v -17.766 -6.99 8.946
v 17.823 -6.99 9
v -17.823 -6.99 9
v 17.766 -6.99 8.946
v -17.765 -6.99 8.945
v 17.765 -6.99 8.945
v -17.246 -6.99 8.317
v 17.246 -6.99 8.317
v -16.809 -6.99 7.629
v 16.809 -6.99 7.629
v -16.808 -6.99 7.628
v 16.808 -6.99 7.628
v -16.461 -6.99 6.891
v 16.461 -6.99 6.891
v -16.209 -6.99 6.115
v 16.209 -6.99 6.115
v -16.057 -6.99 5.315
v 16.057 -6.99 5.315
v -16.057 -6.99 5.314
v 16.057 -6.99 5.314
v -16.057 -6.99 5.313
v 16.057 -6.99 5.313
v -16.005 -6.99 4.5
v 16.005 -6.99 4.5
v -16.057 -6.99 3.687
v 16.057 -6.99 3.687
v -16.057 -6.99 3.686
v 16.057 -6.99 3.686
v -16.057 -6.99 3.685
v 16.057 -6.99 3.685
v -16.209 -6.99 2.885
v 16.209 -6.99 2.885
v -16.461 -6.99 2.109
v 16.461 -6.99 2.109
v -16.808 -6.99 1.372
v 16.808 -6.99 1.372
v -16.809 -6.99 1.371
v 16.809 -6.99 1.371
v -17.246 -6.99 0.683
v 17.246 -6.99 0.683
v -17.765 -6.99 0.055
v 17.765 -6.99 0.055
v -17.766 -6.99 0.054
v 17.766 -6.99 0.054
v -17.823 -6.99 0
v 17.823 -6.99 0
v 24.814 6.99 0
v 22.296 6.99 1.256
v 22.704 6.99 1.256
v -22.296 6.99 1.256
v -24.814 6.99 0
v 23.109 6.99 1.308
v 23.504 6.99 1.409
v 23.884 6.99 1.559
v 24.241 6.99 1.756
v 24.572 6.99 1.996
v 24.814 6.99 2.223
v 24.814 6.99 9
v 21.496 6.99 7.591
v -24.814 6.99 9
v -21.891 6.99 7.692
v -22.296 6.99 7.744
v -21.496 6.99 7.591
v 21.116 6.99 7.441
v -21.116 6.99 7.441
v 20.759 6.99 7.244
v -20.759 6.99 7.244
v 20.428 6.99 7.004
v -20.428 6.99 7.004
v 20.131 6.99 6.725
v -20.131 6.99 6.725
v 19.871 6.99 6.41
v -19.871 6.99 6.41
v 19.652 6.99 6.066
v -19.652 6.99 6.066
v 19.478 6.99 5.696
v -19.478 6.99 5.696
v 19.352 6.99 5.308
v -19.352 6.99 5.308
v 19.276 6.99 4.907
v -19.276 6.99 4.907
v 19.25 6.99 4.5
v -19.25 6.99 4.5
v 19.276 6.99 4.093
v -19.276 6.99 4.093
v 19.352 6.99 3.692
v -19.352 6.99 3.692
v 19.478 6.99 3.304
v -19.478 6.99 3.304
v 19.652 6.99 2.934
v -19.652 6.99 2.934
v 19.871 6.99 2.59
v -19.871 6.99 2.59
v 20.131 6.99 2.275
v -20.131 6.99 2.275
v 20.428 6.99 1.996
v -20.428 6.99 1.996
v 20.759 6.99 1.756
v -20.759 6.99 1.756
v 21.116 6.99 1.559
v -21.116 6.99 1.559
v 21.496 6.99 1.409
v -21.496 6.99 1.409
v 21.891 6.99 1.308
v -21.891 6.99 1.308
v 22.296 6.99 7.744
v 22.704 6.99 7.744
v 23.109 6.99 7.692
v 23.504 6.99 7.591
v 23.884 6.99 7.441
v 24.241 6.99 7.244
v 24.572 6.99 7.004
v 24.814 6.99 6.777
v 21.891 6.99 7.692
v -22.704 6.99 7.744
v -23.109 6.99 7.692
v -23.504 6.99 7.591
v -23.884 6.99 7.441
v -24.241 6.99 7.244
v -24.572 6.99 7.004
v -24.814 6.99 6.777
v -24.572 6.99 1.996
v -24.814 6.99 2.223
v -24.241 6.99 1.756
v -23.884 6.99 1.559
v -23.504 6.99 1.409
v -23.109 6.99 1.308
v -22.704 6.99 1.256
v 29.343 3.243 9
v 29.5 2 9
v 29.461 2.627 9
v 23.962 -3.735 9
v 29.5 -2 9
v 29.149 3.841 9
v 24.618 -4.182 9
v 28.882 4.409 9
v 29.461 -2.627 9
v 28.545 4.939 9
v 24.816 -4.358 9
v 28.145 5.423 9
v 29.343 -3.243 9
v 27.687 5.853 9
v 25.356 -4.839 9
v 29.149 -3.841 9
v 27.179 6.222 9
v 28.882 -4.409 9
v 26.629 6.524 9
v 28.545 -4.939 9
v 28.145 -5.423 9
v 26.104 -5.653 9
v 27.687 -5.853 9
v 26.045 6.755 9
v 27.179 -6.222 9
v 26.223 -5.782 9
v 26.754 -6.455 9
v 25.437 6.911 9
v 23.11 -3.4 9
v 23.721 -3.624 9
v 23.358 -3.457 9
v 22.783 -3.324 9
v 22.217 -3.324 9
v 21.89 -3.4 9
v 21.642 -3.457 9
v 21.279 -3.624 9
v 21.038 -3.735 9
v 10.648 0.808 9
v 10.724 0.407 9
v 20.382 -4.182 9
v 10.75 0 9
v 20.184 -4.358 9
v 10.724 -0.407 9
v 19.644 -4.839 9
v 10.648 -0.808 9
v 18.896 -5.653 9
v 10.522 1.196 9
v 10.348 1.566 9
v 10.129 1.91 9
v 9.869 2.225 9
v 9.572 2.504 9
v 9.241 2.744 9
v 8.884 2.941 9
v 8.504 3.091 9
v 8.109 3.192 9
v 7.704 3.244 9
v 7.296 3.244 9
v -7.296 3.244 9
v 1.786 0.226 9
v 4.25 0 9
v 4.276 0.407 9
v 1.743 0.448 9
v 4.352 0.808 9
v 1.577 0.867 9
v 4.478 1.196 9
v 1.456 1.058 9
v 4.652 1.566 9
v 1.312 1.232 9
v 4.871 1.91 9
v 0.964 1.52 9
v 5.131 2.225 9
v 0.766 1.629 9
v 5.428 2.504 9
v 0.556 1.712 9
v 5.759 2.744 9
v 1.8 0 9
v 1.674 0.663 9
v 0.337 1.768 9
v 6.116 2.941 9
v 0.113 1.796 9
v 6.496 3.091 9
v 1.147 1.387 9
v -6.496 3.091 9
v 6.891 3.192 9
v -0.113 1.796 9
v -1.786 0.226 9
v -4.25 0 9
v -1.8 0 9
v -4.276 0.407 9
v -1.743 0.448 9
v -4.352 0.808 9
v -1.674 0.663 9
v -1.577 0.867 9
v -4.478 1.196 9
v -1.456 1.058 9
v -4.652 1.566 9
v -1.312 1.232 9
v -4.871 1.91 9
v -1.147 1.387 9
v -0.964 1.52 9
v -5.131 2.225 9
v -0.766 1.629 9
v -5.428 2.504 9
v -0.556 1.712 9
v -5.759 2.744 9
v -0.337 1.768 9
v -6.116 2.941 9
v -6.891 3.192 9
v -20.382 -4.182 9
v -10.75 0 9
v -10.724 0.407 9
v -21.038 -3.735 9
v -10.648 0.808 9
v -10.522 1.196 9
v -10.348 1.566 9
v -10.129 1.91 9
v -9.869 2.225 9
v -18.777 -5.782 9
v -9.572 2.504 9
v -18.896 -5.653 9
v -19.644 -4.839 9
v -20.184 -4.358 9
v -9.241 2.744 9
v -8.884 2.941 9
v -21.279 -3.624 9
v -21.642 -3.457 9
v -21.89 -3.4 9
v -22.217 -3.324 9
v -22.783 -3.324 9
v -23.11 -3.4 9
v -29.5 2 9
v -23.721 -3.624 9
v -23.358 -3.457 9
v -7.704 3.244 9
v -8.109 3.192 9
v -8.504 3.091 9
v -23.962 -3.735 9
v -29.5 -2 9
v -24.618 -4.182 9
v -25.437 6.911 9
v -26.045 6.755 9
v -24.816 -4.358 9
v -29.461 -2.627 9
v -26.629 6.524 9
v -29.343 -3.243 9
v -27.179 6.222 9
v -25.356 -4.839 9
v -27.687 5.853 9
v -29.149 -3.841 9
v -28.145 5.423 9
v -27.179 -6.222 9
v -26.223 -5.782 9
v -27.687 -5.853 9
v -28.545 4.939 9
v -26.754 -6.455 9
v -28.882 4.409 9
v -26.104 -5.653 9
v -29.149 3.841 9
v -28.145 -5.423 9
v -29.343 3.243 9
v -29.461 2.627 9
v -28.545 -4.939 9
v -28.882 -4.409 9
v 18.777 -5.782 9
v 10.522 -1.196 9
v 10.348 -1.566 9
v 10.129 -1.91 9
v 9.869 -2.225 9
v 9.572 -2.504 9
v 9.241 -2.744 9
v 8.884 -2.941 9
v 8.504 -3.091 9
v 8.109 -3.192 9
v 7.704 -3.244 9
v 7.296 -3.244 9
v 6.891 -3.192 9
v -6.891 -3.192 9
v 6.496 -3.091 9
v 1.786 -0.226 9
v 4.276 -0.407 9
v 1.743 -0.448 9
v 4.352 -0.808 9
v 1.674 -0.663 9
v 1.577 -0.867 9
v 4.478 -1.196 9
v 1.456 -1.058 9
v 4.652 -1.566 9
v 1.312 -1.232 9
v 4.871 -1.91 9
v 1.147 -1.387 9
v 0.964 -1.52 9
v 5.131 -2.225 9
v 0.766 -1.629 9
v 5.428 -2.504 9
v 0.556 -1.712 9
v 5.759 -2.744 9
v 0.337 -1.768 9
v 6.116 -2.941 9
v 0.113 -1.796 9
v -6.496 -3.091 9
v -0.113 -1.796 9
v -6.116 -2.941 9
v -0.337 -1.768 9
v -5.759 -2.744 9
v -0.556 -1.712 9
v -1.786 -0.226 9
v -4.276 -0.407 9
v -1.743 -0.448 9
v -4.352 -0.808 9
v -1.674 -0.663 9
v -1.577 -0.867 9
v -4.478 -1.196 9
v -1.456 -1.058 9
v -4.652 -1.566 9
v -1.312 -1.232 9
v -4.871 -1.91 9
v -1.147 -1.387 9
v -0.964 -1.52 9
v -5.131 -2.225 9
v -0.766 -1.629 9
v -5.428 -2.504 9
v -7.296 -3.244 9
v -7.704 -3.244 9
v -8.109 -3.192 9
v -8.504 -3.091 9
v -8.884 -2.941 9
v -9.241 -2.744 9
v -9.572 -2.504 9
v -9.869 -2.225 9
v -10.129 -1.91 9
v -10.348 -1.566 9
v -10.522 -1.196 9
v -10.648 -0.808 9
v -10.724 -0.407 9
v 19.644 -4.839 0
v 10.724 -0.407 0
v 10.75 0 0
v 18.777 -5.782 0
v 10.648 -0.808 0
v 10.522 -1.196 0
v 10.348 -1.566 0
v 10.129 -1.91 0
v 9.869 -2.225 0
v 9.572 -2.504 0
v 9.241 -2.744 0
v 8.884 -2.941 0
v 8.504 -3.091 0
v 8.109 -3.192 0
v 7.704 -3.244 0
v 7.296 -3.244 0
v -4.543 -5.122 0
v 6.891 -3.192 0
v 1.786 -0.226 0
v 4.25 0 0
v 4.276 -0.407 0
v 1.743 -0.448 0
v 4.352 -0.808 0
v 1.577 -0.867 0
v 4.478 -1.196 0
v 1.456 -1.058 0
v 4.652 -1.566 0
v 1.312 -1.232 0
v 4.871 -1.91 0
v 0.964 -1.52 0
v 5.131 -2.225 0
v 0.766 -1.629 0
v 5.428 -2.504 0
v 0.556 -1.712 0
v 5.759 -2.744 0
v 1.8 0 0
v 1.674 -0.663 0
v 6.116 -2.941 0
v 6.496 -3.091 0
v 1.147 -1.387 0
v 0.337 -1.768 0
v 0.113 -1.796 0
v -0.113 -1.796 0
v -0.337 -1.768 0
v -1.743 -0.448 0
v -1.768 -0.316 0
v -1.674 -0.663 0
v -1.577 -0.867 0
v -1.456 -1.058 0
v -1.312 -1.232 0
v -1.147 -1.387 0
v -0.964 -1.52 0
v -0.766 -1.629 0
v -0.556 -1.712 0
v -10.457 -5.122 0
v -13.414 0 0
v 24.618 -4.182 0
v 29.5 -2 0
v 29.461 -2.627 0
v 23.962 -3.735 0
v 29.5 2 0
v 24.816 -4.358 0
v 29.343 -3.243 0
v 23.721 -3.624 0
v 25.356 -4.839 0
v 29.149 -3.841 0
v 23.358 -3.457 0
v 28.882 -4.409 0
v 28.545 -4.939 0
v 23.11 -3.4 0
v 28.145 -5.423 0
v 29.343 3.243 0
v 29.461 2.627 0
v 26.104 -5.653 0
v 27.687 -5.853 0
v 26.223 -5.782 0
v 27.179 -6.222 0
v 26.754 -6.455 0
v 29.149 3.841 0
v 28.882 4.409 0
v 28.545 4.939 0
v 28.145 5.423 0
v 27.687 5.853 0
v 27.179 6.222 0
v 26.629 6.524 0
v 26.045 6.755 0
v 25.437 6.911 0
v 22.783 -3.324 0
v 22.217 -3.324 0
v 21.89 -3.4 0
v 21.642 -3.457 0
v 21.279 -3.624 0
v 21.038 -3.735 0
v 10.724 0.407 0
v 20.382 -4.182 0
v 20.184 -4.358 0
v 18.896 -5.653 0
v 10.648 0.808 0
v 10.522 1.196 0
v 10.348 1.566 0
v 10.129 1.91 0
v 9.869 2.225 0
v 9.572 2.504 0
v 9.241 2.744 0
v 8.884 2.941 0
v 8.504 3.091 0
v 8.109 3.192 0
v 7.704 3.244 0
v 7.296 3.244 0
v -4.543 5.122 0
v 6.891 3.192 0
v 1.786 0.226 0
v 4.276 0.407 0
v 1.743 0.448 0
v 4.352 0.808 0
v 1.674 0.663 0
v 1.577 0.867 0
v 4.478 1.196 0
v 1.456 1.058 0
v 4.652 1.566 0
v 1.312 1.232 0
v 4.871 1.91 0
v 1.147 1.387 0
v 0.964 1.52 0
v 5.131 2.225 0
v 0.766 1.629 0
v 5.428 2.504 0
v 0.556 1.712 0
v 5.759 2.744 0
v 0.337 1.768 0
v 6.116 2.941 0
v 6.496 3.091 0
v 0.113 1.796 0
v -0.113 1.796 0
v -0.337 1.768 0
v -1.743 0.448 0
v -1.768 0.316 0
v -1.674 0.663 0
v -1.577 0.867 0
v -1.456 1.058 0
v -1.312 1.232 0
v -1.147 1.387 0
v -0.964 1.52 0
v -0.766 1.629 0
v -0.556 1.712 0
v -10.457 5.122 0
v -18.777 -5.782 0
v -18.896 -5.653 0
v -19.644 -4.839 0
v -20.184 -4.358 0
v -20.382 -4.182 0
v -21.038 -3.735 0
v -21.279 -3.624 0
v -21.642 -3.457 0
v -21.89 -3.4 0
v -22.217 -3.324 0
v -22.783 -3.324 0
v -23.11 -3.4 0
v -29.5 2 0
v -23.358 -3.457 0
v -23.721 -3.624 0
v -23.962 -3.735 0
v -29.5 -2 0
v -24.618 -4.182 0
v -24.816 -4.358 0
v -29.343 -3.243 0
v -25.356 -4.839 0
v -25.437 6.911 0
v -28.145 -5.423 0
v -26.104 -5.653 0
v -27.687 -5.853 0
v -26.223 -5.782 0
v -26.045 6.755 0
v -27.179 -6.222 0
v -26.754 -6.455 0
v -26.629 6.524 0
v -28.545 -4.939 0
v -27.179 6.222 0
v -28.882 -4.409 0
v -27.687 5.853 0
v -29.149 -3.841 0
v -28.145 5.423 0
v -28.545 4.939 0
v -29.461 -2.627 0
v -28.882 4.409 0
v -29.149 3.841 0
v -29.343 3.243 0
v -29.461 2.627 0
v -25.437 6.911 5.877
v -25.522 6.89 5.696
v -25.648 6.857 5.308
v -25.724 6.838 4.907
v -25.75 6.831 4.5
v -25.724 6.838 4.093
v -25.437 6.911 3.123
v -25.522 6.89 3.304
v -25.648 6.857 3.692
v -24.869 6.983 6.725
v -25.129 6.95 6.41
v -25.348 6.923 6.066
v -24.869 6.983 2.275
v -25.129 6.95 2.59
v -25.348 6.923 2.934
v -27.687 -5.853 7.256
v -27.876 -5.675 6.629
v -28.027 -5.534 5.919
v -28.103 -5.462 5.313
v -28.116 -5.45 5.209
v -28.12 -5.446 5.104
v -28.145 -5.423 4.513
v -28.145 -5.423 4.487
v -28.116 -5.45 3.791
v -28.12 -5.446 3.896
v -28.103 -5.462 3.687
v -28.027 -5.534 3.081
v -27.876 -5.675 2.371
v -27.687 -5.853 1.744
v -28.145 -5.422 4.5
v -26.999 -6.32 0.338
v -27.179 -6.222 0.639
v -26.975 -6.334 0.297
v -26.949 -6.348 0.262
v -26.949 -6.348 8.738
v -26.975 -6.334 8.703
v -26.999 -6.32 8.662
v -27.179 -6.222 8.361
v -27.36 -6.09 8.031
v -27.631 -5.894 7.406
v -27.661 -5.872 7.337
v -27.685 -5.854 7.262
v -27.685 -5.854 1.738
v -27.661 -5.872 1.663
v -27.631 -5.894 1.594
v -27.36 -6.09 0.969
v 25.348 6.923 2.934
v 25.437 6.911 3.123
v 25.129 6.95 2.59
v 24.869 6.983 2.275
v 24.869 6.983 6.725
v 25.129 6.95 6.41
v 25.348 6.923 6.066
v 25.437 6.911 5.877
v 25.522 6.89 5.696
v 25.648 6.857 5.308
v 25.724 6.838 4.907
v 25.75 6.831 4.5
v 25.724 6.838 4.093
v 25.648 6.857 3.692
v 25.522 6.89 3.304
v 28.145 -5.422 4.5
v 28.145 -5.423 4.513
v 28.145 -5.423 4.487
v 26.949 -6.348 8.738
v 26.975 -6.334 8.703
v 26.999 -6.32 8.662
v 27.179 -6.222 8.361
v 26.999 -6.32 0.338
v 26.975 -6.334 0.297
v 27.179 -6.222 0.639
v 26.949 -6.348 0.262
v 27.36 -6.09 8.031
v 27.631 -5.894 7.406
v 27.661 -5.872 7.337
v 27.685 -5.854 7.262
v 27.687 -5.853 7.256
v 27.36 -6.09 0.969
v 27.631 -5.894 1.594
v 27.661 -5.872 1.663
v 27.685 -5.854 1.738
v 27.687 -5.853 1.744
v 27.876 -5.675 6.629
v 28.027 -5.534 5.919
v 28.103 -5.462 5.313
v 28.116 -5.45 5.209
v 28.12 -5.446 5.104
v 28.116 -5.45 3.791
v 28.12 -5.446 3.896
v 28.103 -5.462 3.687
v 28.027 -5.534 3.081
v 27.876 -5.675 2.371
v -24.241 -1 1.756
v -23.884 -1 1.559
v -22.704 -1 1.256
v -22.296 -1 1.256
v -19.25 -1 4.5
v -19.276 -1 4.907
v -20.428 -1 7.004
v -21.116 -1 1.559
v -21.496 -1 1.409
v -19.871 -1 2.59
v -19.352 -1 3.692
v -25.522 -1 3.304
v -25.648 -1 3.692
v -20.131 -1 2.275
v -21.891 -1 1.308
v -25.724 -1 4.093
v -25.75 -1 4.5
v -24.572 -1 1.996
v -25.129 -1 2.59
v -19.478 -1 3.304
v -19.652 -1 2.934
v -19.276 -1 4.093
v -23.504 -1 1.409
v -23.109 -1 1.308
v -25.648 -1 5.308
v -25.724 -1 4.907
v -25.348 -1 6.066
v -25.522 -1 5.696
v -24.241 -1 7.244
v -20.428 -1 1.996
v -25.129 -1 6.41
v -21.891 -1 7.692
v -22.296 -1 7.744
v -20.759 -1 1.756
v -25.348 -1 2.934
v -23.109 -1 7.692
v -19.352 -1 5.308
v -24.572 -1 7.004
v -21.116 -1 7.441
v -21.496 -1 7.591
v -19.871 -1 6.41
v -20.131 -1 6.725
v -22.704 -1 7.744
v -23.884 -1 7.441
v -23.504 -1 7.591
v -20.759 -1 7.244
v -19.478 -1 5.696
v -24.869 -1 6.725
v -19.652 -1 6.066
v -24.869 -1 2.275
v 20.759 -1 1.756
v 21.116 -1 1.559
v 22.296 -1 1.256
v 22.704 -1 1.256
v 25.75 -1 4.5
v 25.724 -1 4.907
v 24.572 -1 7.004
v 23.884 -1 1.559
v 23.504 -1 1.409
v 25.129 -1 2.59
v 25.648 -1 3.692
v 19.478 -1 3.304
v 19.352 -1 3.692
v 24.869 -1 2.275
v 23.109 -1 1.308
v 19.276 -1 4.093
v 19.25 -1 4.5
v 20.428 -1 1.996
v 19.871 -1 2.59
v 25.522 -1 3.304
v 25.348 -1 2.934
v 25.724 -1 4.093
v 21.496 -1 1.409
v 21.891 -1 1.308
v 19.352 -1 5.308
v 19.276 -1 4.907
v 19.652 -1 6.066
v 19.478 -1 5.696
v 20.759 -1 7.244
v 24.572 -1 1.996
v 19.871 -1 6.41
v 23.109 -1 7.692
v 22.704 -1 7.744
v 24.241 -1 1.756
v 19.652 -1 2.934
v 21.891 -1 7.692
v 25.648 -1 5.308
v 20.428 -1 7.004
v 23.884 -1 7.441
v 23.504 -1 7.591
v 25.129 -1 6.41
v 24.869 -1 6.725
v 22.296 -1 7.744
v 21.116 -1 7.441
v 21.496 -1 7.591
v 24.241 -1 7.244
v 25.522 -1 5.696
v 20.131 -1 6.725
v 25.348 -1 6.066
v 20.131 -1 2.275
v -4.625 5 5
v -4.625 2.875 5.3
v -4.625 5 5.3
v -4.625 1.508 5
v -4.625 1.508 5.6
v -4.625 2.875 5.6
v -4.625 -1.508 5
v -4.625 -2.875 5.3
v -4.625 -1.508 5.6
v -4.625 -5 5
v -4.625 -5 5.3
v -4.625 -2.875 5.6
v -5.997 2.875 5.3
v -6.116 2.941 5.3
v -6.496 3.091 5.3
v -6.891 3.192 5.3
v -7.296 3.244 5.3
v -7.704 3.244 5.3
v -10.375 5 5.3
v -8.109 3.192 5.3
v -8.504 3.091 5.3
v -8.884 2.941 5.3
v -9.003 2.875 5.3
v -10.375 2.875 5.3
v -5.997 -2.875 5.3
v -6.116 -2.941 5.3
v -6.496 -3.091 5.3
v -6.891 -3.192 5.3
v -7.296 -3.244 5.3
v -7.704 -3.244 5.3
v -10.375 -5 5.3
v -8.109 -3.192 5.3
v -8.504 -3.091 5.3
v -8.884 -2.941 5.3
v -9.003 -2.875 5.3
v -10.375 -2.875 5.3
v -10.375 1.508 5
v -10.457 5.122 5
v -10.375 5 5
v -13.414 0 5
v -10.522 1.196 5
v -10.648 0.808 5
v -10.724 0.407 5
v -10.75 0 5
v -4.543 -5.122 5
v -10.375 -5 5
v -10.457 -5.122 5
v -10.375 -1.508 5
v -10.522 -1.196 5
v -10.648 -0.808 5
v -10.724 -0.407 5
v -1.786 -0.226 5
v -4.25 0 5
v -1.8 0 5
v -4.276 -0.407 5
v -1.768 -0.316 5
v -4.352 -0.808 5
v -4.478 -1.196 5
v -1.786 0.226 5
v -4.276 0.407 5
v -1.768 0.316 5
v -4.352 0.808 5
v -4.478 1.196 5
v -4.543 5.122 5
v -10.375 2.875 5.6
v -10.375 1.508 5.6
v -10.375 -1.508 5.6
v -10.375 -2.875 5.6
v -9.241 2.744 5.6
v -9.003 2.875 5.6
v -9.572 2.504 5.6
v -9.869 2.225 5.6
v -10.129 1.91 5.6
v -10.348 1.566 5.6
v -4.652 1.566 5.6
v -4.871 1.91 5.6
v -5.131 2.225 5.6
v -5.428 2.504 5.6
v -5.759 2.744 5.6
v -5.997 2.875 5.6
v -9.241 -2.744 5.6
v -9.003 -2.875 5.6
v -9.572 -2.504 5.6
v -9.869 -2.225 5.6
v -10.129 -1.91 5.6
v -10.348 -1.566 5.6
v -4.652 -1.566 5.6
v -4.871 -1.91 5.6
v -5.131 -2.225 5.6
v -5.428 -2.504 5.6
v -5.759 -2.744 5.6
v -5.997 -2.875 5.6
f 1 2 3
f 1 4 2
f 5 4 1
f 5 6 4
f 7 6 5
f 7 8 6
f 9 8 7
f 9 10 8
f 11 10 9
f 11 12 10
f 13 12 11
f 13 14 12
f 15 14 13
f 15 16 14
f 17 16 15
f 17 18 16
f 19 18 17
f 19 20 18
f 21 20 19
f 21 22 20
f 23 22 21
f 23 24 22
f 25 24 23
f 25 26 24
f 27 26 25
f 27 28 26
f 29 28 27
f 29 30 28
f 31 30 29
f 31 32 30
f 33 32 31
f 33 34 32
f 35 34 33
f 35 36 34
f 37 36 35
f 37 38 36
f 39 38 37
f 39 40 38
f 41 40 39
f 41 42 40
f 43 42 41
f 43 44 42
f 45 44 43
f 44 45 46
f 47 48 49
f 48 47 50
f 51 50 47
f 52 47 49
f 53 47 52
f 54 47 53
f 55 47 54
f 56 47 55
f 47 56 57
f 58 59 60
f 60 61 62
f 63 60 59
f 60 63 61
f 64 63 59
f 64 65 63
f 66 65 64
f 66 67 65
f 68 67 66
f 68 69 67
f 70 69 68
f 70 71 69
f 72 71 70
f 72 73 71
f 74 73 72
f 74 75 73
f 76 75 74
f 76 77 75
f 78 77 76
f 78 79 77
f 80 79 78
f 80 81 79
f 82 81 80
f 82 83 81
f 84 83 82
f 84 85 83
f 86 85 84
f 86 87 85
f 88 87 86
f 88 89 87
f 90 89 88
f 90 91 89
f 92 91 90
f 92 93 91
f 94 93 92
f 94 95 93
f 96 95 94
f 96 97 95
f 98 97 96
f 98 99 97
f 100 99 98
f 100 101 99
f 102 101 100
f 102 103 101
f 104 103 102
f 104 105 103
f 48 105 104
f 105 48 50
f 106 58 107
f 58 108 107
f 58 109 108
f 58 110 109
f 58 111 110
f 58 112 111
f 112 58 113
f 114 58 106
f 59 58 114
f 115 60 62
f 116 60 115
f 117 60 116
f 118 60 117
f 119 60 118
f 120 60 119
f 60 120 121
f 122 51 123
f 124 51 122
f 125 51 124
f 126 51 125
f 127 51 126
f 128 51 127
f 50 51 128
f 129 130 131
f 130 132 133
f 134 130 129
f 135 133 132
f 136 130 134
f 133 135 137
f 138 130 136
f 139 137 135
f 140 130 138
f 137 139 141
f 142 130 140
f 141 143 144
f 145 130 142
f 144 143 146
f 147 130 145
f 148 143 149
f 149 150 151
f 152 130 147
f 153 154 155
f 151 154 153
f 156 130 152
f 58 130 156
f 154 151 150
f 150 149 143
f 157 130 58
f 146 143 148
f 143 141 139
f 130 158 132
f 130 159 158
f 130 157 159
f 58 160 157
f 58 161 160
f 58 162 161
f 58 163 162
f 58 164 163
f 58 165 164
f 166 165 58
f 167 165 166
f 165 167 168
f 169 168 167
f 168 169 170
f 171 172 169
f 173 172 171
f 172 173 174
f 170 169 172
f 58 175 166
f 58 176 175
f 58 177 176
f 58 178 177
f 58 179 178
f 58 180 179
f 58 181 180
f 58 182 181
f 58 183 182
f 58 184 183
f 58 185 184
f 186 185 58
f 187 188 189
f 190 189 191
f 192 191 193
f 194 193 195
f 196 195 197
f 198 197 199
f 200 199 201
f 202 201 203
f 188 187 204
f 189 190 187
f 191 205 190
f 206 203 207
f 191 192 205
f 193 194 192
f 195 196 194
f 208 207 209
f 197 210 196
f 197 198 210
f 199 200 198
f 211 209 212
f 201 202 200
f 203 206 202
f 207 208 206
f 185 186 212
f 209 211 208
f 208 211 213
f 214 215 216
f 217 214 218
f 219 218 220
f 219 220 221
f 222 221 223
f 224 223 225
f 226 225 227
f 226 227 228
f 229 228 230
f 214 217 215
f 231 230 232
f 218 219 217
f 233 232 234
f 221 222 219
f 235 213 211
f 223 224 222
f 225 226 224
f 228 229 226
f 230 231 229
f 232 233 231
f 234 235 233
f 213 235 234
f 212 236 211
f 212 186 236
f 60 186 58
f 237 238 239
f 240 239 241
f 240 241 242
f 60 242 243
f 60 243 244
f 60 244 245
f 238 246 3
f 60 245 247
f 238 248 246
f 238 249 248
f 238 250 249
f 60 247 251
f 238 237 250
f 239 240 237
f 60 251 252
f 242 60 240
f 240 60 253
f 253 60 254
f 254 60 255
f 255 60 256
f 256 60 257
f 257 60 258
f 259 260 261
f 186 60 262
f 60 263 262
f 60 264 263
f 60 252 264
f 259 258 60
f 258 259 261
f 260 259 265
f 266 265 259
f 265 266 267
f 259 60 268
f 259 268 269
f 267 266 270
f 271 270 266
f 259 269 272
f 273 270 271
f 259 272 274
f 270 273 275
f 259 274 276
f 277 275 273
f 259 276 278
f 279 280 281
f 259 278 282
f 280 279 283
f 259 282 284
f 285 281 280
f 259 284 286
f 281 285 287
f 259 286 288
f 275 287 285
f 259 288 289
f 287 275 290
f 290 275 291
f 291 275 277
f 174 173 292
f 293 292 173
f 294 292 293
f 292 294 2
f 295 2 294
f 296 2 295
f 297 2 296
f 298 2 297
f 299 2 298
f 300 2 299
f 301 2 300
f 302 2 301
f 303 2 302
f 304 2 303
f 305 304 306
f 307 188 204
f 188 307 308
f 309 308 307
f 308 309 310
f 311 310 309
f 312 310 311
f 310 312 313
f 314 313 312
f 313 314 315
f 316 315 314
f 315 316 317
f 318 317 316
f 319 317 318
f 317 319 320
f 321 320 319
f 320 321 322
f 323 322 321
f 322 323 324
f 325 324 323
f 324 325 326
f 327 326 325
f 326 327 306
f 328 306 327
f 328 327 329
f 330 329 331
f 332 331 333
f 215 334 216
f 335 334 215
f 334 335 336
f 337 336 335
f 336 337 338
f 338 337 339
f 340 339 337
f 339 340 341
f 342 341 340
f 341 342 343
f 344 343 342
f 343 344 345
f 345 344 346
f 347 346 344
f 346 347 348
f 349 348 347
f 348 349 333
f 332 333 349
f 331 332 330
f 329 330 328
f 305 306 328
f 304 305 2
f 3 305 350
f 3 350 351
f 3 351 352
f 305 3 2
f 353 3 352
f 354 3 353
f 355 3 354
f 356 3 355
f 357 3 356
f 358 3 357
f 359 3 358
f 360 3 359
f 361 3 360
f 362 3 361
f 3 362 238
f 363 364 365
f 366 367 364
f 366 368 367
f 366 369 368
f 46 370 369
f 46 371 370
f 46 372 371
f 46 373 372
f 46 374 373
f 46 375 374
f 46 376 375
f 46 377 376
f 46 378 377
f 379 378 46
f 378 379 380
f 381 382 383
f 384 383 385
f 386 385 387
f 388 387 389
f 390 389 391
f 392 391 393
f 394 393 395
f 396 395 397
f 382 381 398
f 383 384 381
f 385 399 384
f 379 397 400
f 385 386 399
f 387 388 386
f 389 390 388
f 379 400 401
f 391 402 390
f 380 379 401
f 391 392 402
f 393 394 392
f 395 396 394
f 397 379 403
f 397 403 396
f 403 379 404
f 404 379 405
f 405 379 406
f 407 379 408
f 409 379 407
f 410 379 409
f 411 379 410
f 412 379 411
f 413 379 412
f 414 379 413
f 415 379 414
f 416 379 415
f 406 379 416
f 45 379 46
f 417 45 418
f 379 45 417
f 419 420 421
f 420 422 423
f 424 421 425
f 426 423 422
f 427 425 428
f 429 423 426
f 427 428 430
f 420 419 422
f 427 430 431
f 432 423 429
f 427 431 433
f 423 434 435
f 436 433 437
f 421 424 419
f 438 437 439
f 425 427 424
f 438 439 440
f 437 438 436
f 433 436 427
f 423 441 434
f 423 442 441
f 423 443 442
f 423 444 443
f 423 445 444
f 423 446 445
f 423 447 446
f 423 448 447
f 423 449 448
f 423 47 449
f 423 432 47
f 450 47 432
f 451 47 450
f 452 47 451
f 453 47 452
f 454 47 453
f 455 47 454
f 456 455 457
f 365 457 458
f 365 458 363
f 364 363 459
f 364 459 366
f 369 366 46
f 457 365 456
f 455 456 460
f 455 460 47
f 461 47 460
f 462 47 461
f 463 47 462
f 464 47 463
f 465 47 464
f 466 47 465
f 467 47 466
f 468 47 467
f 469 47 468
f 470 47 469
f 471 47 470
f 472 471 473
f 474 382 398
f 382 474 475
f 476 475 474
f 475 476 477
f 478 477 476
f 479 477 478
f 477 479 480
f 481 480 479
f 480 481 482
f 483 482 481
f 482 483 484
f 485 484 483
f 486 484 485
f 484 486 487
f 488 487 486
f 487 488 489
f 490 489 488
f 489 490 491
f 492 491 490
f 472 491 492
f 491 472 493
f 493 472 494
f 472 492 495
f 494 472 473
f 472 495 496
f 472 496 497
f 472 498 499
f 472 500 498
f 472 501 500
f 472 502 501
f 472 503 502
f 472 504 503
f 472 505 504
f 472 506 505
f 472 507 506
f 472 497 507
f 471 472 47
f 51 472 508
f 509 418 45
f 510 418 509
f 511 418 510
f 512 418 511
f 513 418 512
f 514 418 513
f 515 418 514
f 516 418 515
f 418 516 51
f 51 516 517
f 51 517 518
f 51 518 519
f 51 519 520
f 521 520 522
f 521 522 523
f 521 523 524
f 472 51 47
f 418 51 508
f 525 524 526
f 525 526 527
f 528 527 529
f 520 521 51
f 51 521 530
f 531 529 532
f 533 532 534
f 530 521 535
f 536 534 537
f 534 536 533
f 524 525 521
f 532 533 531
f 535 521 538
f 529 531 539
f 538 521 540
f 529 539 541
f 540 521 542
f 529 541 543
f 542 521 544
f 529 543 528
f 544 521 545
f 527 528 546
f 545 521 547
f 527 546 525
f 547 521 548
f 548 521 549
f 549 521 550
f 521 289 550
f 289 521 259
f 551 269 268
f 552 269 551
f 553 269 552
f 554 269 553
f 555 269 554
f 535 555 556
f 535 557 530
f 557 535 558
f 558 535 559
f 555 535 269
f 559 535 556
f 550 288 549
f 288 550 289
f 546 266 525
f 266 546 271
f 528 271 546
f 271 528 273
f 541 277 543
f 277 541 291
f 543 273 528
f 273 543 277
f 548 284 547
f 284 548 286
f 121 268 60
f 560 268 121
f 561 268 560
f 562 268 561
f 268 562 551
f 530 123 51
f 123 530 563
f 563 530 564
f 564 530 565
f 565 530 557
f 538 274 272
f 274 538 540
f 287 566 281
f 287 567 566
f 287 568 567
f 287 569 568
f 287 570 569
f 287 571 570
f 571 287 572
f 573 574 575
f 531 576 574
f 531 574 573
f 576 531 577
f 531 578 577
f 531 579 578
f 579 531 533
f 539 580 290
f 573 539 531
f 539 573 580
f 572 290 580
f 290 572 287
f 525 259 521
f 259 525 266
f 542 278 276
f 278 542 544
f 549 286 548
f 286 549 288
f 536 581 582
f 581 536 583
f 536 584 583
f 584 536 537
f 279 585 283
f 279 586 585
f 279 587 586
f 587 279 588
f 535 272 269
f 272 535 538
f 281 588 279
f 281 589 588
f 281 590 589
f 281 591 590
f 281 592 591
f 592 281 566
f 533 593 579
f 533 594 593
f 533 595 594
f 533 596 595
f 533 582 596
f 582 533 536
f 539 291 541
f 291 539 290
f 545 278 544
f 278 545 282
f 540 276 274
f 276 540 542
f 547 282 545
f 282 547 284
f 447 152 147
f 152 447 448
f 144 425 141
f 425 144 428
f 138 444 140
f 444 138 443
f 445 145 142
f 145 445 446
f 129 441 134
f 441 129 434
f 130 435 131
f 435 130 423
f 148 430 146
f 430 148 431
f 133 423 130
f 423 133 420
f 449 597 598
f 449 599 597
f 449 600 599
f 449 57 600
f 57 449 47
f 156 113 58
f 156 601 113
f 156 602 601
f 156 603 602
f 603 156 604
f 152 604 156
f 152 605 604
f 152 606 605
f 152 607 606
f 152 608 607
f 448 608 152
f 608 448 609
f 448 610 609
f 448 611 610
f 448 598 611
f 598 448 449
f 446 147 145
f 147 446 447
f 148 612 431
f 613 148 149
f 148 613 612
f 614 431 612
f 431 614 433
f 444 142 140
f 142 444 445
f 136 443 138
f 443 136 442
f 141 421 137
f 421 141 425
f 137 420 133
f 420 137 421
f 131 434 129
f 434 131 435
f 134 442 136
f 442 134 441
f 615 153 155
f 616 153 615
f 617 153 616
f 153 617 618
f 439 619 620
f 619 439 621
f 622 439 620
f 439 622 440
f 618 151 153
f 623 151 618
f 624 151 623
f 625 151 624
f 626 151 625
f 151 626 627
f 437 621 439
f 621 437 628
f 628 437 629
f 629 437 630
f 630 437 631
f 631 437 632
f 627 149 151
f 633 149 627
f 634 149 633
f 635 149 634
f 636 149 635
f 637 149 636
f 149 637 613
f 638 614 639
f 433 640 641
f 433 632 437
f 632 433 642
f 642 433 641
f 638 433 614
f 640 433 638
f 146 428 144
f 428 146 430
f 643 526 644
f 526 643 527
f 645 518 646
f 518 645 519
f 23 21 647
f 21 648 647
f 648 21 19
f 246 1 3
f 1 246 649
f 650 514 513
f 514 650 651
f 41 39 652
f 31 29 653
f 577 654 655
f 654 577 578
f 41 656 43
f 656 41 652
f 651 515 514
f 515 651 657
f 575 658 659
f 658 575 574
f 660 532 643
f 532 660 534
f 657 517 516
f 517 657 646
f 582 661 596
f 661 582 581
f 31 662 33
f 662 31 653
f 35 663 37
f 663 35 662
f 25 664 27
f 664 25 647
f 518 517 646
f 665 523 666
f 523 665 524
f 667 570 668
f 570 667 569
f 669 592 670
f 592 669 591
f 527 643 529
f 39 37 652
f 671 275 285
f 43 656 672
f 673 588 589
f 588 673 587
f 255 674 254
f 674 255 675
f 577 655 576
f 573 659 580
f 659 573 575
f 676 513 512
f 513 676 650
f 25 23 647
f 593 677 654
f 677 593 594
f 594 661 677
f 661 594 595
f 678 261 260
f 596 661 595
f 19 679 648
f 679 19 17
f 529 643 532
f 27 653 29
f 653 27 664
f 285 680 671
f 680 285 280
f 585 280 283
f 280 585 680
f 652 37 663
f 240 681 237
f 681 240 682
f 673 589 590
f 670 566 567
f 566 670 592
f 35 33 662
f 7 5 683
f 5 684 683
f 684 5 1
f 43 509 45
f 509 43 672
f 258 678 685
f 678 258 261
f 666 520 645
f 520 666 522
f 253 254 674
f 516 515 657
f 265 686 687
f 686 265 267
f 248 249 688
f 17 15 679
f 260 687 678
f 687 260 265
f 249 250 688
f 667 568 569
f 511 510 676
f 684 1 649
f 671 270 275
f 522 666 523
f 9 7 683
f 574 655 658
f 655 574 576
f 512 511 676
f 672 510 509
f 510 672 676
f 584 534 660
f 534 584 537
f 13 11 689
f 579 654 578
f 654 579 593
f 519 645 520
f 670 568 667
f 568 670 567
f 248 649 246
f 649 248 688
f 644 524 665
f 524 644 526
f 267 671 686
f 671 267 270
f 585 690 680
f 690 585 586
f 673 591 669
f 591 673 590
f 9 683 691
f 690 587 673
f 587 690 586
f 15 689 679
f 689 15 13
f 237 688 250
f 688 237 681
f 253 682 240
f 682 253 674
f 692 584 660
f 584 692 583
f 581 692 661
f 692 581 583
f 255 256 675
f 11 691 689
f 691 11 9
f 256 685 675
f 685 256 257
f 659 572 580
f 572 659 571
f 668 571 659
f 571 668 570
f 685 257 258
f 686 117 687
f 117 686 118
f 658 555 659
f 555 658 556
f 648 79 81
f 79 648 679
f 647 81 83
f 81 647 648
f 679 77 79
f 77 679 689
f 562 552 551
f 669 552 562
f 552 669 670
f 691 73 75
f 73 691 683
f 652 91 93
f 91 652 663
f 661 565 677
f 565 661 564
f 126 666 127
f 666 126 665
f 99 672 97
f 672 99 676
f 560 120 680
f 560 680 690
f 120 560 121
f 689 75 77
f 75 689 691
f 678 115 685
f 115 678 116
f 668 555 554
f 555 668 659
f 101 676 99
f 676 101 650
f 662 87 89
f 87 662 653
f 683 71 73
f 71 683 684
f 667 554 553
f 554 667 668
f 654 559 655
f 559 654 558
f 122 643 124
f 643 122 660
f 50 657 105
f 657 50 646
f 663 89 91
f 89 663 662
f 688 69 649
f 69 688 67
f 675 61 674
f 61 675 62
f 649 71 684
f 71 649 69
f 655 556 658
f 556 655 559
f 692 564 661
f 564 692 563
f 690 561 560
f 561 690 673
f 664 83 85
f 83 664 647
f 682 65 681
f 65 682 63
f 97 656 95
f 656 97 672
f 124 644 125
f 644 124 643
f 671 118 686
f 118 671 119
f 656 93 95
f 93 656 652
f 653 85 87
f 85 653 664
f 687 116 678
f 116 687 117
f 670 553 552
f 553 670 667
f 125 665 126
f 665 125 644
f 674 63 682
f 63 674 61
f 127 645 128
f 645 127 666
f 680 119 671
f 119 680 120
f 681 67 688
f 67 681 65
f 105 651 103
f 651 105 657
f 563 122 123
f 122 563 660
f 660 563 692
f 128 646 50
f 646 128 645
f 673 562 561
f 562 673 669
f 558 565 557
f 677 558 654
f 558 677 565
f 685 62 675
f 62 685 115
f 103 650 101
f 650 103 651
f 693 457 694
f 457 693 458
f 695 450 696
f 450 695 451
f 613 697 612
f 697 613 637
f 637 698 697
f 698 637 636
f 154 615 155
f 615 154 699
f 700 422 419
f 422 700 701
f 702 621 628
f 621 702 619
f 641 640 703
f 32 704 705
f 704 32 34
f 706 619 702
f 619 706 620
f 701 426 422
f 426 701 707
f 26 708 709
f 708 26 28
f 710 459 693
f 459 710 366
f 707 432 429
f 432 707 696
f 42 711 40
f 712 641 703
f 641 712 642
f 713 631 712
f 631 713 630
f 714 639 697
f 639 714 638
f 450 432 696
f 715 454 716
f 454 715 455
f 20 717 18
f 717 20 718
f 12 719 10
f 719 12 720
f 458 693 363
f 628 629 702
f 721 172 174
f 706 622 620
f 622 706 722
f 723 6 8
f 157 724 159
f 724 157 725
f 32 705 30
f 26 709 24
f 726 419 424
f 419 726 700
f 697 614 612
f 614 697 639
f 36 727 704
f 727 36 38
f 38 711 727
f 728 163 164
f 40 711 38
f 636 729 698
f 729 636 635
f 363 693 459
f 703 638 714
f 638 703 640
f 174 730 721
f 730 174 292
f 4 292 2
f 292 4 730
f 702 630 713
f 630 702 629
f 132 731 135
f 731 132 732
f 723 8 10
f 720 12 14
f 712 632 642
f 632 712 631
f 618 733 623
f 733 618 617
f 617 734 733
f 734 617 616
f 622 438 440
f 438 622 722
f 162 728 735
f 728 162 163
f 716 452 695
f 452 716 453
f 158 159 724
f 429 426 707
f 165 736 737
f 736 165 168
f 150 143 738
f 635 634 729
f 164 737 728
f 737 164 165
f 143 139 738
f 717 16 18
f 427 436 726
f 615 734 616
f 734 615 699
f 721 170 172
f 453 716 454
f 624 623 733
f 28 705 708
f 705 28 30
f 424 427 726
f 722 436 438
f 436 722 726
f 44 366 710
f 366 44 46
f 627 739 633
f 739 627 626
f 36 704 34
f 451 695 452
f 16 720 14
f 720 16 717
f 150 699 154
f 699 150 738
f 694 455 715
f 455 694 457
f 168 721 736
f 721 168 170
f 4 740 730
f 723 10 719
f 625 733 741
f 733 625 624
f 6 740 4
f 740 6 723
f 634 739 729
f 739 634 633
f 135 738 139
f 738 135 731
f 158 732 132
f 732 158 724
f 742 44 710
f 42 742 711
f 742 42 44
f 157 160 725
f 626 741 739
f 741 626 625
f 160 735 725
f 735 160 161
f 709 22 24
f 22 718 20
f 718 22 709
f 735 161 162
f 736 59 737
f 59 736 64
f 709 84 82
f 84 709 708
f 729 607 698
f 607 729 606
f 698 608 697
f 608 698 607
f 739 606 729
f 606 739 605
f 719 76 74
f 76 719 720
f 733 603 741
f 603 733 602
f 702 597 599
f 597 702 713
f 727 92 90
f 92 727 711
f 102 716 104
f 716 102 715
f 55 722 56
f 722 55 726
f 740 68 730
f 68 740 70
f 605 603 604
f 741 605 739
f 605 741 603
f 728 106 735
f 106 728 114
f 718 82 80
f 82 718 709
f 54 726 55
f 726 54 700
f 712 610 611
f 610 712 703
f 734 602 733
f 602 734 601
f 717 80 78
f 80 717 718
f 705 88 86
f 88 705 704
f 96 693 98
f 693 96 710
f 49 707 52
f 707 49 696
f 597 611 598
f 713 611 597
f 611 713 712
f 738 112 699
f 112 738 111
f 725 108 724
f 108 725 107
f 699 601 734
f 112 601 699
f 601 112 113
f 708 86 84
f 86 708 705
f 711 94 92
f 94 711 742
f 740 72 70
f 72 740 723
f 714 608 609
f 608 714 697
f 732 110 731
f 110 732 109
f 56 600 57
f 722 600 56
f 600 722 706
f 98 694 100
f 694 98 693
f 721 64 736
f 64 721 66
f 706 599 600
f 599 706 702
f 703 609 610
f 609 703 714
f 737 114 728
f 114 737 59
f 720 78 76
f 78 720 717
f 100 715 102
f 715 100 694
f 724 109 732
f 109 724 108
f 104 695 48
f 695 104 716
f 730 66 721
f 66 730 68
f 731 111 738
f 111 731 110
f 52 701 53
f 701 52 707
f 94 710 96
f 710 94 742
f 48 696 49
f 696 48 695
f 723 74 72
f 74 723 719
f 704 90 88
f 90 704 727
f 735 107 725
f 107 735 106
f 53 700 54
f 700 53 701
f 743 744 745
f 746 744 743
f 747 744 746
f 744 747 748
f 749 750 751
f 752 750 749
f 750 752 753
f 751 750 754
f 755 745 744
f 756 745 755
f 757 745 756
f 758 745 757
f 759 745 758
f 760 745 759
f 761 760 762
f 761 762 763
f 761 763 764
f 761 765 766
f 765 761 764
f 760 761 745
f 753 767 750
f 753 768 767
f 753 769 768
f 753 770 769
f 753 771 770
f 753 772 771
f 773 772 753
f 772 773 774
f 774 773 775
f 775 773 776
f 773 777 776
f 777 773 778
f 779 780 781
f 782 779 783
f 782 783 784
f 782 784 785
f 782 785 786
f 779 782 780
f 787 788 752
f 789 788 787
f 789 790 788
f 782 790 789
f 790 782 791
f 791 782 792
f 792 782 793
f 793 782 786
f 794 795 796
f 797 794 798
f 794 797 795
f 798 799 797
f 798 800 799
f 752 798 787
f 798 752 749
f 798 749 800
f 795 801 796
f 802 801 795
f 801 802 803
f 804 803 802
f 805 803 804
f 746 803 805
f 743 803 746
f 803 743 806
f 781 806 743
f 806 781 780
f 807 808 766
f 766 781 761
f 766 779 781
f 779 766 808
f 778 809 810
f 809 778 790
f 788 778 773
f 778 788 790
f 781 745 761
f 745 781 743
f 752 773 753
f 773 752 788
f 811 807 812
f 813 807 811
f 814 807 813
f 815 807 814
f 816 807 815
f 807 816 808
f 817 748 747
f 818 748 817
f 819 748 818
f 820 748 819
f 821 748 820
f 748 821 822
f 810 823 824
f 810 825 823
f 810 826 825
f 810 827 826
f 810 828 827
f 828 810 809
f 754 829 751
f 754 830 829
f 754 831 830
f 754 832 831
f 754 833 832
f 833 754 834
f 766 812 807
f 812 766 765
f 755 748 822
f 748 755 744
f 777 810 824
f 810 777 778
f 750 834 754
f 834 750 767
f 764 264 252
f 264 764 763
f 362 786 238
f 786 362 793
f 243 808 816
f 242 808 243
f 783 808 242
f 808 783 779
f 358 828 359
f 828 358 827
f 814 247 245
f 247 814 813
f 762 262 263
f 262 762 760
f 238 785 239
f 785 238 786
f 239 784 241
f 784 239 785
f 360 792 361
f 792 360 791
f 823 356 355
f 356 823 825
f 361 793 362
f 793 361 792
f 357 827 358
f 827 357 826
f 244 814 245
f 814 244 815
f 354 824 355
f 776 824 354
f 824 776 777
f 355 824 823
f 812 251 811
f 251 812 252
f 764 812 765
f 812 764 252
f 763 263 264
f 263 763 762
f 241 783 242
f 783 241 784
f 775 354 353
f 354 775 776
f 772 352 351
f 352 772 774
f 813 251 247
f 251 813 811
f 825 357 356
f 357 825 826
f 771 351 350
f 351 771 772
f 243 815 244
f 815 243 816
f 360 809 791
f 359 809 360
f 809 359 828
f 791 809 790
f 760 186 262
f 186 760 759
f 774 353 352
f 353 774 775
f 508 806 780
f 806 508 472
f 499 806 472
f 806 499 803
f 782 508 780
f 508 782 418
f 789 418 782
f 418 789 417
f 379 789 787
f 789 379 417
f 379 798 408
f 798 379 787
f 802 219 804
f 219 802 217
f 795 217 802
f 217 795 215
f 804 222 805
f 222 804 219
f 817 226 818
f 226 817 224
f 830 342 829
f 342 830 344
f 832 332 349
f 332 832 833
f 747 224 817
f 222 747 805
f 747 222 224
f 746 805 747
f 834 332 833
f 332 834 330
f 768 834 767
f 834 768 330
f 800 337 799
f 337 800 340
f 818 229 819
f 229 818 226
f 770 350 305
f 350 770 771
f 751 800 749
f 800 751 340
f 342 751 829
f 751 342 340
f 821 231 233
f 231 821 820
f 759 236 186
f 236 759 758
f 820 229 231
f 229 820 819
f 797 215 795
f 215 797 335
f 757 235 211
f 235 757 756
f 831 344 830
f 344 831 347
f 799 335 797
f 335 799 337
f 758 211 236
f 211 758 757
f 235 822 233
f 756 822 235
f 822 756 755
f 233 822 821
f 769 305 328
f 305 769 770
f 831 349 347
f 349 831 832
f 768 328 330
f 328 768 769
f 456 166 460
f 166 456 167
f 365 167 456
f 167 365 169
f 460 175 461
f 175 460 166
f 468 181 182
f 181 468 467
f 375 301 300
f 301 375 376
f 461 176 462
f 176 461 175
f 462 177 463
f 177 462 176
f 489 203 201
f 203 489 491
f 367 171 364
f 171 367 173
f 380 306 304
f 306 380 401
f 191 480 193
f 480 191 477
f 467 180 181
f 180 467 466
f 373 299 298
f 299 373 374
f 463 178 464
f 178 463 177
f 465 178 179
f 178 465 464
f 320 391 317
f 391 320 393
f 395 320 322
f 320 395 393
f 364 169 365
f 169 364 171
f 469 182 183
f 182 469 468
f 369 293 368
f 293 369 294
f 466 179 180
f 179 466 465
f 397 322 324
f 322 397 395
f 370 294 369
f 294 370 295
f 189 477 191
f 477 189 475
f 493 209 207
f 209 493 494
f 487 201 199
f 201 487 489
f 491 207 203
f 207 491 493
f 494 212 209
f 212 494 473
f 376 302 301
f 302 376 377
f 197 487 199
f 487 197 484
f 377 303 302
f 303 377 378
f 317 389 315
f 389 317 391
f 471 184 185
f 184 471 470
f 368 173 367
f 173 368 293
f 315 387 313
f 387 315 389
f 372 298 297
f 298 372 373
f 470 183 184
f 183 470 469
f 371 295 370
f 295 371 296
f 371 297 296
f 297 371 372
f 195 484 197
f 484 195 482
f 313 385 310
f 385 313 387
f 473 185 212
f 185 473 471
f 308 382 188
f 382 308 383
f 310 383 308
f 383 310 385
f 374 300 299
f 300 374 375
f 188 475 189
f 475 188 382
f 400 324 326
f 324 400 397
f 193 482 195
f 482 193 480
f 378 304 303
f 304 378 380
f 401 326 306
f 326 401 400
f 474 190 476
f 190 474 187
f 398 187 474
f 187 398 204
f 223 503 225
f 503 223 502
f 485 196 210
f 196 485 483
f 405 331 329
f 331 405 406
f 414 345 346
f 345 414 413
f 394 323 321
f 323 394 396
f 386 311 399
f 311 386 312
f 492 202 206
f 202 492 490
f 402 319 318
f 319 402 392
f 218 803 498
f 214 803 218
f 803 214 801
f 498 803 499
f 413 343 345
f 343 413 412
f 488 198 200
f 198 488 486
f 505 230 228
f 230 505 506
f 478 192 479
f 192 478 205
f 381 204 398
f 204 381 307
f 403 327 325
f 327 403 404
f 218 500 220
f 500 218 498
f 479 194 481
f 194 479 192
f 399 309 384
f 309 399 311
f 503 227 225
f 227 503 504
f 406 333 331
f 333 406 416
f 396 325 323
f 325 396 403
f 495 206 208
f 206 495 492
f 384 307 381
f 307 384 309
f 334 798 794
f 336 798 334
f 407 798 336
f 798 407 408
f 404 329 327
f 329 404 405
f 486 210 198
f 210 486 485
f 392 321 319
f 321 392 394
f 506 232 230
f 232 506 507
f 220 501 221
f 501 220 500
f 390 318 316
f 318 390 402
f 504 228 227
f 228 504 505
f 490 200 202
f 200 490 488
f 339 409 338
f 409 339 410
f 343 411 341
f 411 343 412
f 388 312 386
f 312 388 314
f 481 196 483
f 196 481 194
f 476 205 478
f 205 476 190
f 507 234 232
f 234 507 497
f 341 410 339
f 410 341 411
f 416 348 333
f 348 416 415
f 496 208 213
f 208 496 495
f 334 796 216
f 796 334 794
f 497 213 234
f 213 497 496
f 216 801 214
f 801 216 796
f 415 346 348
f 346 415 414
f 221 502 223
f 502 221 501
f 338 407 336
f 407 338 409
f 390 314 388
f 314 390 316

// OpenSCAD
$fn = 50;


difference() {
	union() {
		hull() {
			translate(v = [-9.5000000000, 2.0000000000, 0]) {
				cylinder(h = 9, r = 5);
			}
			translate(v = [9.5000000000, 2.0000000000, 0]) {
				cylinder(h = 9, r = 5);
			}
			translate(v = [-9.5000000000, -2.0000000000, 0]) {
				cylinder(h = 9, r = 5);
			}
			translate(v = [9.5000000000, -2.0000000000, 0]) {
				cylinder(h = 9, r = 5);
			}
		}
		translate(v = [-15.0000000000, 0.0000000000, 0]) {
			hull() {
				translate(v = [-9.5000000000, 2.0000000000, 0]) {
					cylinder(h = 9, r = 5);
				}
				translate(v = [9.5000000000, 2.0000000000, 0]) {
					cylinder(h = 9, r = 5);
				}
				translate(v = [-9.5000000000, -2.0000000000, 0]) {
					cylinder(h = 9, r = 5);
				}
				translate(v = [9.5000000000, -2.0000000000, 0]) {
					cylinder(h = 9, r = 5);
				}
			}
		}
		translate(v = [-15.0000000000, 0.0000000000, 0]) {
			hull() {
				translate(v = [-9.5000000000, 2.0000000000, 0]) {
					cylinder(h = 9, r = 5);
				}
				translate(v = [9.5000000000, 2.0000000000, 0]) {
					cylinder(h = 9, r = 5);
				}
				translate(v = [-9.5000000000, -2.0000000000, 0]) {
					cylinder(h = 9, r = 5);
				}
				translate(v = [9.5000000000, -2.0000000000, 0]) {
					cylinder(h = 9, r = 5);
				}
			}
		}
		translate(v = [15.0000000000, 0.0000000000, 0]) {
			hull() {
				translate(v = [-9.5000000000, 2.0000000000, 0]) {
					cylinder(h = 9, r = 5);
				}
				translate(v = [9.5000000000, 2.0000000000, 0]) {
					cylinder(h = 9, r = 5);
				}
				translate(v = [-9.5000000000, -2.0000000000, 0]) {
					cylinder(h = 9, r = 5);
				}
				translate(v = [9.5000000000, -2.0000000000, 0]) {
					cylinder(h = 9, r = 5);
				}
			}
		}
		translate(v = [15.0000000000, 0.0000000000, 0]) {
			hull() {
				translate(v = [-9.5000000000, 2.0000000000, 0]) {
					cylinder(h = 9, r = 5);
				}
				translate(v = [9.5000000000, 2.0000000000, 0]) {
					cylinder(h = 9, r = 5);
				}
				translate(v = [-9.5000000000, -2.0000000000, 0]) {
					cylinder(h = 9, r = 5);
				}
				translate(v = [9.5000000000, -2.0000000000, 0]) {
					cylinder(h = 9, r = 5);
				}
			}
		}
	}
	union() {
		translate(v = [-22.5000000000, -7.0000000000, 4.5000000000]) {
			rotate(a = [90, 0, 0]) {
				difference() {
					union() {
						#translate(v = [0, 0, -14.0000000000]) {
							cylinder(h = 14, r = 2.2500000000);
						}
						#translate(v = [0, 0, -6]) {
							cylinder(h = 6, r1 = 3.2500000000, r2 = 6.5000000000);
						}
						#translate(v = [0, 0, -14.0000000000]) {
							cylinder(h = 14, r = 3.2500000000);
						}
						#translate(v = [0, 0, -14.0000000000]) {
							cylinder(h = 14, r = 2.2500000000);
						}
					}
					union();
				}
			}
		}
		translate(v = [22.5000000000, -7.0000000000, 4.5000000000]) {
			rotate(a = [90, 0, 0]) {
				difference() {
					union() {
						#translate(v = [0, 0, -14.0000000000]) {
							cylinder(h = 14, r = 2.2500000000);
						}
						#translate(v = [0, 0, -6]) {
							cylinder(h = 6, r1 = 3.2500000000, r2 = 6.5000000000);
						}
						#translate(v = [0, 0, -14.0000000000]) {
							cylinder(h = 14, r = 3.2500000000);
						}
						#translate(v = [0, 0, -14.0000000000]) {
							cylinder(h = 14, r = 2.2500000000);
						}
					}
					union();
				}
			}
		}
		translate(v = [-7.5000000000, 0.0000000000, 0]) {
			rotate(a = [0, 0, 0]) {
				difference() {
					union() {
						#translate(v = [-2.8750000000, -5.0000000000, -0.3000000000]) {
							cube(size = [5.7500000000, 10, 0.3000000000]);
						}
						#translate(v = [-2.8750000000, -2.8750000000, -0.6000000000]) {
							cube(size = [5.7500000000, 5.7500000000, 0.3000000000]);
						}
						#translate(v = [-2.8750000000, -5.0000000000, 5]) {
							cube(size = [5.7500000000, 10, 0.3000000000]);
						}
						#translate(v = [-2.8750000000, -2.8750000000, 5.3000000000]) {
							cube(size = [5.7500000000, 5.7500000000, 0.3000000000]);
						}
						#translate(v = [0, 0, -100.0000000000]) {
							cylinder(h = 200, r = 3.2500000000);
						}
						#linear_extrude(height = 5) {
							polygon(points = [[5.9142500000, 0.0000000000], [2.9571250000, 5.1218907443], [-2.9571250000, 5.1218907443], [-5.9142500000, 0.0000000000], [-2.9571250000, -5.1218907443], [2.9571250000, -5.1218907443]]);
						}
						#translate(v = [-2.8750000000, -5.0000000000, -0.3000000000]) {
							cube(size = [5.7500000000, 10, 0.3000000000]);
						}
						#translate(v = [-2.8750000000, -2.8750000000, -0.6000000000]) {
							cube(size = [5.7500000000, 5.7500000000, 0.3000000000]);
						}
						#translate(v = [-2.8750000000, -5.0000000000, 5]) {
							cube(size = [5.7500000000, 10, 0.3000000000]);
						}
						#translate(v = [-2.8750000000, -2.8750000000, 5.3000000000]) {
							cube(size = [5.7500000000, 5.7500000000, 0.3000000000]);
						}
						#translate(v = [0, 0, -100.0000000000]) {
							cylinder(h = 200, r = 3.2500000000);
						}
						#translate(v = [-2.8750000000, -5.0000000000, -0.3000000000]) {
							cube(size = [5.7500000000, 10, 0.3000000000]);
						}
						#translate(v = [-2.8750000000, -2.8750000000, -0.6000000000]) {
							cube(size = [5.7500000000, 5.7500000000, 0.3000000000]);
						}
						#translate(v = [-2.8750000000, -5.0000000000, 5]) {
							cube(size = [5.7500000000, 10, 0.3000000000]);
						}
						#translate(v = [-2.8750000000, -2.8750000000, 5.3000000000]) {
							cube(size = [5.7500000000, 5.7500000000, 0.3000000000]);
						}
						#translate(v = [0, 0, -100.0000000000]) {
							cylinder(h = 200, r = 3.2500000000);
						}
					}
					union();
				}
			}
		}
		translate(v = [-7.5000000000, 0.0000000000, 0]) {
			translate(v = [0, 0, -100]) {
				cylinder(h = 200, r = 3.2500000000);
			}
		}
		translate(v = [7.5000000000, 0.0000000000, 0]) {
			translate(v = [0, 0, -100]) {
				cylinder(h = 200, r = 3.2500000000);
			}
		}
		translate(v = [-7.5000000000, 0.0000000000, 0]) {
			translate(v = [0, 0, -100]) {
				cylinder(h = 200, r = 1.8000000000);
			}
		}
		translate(v = [0, 0, -100]) {
			cylinder(h = 200, r = 1.8000000000);
		}
		translate(v = [7.5000000000, 0.0000000000, 0]) {
			translate(v = [0, 0, -100]) {
				cylinder(h = 200, r = 1.8000000000);
			}
		}
	}
}
